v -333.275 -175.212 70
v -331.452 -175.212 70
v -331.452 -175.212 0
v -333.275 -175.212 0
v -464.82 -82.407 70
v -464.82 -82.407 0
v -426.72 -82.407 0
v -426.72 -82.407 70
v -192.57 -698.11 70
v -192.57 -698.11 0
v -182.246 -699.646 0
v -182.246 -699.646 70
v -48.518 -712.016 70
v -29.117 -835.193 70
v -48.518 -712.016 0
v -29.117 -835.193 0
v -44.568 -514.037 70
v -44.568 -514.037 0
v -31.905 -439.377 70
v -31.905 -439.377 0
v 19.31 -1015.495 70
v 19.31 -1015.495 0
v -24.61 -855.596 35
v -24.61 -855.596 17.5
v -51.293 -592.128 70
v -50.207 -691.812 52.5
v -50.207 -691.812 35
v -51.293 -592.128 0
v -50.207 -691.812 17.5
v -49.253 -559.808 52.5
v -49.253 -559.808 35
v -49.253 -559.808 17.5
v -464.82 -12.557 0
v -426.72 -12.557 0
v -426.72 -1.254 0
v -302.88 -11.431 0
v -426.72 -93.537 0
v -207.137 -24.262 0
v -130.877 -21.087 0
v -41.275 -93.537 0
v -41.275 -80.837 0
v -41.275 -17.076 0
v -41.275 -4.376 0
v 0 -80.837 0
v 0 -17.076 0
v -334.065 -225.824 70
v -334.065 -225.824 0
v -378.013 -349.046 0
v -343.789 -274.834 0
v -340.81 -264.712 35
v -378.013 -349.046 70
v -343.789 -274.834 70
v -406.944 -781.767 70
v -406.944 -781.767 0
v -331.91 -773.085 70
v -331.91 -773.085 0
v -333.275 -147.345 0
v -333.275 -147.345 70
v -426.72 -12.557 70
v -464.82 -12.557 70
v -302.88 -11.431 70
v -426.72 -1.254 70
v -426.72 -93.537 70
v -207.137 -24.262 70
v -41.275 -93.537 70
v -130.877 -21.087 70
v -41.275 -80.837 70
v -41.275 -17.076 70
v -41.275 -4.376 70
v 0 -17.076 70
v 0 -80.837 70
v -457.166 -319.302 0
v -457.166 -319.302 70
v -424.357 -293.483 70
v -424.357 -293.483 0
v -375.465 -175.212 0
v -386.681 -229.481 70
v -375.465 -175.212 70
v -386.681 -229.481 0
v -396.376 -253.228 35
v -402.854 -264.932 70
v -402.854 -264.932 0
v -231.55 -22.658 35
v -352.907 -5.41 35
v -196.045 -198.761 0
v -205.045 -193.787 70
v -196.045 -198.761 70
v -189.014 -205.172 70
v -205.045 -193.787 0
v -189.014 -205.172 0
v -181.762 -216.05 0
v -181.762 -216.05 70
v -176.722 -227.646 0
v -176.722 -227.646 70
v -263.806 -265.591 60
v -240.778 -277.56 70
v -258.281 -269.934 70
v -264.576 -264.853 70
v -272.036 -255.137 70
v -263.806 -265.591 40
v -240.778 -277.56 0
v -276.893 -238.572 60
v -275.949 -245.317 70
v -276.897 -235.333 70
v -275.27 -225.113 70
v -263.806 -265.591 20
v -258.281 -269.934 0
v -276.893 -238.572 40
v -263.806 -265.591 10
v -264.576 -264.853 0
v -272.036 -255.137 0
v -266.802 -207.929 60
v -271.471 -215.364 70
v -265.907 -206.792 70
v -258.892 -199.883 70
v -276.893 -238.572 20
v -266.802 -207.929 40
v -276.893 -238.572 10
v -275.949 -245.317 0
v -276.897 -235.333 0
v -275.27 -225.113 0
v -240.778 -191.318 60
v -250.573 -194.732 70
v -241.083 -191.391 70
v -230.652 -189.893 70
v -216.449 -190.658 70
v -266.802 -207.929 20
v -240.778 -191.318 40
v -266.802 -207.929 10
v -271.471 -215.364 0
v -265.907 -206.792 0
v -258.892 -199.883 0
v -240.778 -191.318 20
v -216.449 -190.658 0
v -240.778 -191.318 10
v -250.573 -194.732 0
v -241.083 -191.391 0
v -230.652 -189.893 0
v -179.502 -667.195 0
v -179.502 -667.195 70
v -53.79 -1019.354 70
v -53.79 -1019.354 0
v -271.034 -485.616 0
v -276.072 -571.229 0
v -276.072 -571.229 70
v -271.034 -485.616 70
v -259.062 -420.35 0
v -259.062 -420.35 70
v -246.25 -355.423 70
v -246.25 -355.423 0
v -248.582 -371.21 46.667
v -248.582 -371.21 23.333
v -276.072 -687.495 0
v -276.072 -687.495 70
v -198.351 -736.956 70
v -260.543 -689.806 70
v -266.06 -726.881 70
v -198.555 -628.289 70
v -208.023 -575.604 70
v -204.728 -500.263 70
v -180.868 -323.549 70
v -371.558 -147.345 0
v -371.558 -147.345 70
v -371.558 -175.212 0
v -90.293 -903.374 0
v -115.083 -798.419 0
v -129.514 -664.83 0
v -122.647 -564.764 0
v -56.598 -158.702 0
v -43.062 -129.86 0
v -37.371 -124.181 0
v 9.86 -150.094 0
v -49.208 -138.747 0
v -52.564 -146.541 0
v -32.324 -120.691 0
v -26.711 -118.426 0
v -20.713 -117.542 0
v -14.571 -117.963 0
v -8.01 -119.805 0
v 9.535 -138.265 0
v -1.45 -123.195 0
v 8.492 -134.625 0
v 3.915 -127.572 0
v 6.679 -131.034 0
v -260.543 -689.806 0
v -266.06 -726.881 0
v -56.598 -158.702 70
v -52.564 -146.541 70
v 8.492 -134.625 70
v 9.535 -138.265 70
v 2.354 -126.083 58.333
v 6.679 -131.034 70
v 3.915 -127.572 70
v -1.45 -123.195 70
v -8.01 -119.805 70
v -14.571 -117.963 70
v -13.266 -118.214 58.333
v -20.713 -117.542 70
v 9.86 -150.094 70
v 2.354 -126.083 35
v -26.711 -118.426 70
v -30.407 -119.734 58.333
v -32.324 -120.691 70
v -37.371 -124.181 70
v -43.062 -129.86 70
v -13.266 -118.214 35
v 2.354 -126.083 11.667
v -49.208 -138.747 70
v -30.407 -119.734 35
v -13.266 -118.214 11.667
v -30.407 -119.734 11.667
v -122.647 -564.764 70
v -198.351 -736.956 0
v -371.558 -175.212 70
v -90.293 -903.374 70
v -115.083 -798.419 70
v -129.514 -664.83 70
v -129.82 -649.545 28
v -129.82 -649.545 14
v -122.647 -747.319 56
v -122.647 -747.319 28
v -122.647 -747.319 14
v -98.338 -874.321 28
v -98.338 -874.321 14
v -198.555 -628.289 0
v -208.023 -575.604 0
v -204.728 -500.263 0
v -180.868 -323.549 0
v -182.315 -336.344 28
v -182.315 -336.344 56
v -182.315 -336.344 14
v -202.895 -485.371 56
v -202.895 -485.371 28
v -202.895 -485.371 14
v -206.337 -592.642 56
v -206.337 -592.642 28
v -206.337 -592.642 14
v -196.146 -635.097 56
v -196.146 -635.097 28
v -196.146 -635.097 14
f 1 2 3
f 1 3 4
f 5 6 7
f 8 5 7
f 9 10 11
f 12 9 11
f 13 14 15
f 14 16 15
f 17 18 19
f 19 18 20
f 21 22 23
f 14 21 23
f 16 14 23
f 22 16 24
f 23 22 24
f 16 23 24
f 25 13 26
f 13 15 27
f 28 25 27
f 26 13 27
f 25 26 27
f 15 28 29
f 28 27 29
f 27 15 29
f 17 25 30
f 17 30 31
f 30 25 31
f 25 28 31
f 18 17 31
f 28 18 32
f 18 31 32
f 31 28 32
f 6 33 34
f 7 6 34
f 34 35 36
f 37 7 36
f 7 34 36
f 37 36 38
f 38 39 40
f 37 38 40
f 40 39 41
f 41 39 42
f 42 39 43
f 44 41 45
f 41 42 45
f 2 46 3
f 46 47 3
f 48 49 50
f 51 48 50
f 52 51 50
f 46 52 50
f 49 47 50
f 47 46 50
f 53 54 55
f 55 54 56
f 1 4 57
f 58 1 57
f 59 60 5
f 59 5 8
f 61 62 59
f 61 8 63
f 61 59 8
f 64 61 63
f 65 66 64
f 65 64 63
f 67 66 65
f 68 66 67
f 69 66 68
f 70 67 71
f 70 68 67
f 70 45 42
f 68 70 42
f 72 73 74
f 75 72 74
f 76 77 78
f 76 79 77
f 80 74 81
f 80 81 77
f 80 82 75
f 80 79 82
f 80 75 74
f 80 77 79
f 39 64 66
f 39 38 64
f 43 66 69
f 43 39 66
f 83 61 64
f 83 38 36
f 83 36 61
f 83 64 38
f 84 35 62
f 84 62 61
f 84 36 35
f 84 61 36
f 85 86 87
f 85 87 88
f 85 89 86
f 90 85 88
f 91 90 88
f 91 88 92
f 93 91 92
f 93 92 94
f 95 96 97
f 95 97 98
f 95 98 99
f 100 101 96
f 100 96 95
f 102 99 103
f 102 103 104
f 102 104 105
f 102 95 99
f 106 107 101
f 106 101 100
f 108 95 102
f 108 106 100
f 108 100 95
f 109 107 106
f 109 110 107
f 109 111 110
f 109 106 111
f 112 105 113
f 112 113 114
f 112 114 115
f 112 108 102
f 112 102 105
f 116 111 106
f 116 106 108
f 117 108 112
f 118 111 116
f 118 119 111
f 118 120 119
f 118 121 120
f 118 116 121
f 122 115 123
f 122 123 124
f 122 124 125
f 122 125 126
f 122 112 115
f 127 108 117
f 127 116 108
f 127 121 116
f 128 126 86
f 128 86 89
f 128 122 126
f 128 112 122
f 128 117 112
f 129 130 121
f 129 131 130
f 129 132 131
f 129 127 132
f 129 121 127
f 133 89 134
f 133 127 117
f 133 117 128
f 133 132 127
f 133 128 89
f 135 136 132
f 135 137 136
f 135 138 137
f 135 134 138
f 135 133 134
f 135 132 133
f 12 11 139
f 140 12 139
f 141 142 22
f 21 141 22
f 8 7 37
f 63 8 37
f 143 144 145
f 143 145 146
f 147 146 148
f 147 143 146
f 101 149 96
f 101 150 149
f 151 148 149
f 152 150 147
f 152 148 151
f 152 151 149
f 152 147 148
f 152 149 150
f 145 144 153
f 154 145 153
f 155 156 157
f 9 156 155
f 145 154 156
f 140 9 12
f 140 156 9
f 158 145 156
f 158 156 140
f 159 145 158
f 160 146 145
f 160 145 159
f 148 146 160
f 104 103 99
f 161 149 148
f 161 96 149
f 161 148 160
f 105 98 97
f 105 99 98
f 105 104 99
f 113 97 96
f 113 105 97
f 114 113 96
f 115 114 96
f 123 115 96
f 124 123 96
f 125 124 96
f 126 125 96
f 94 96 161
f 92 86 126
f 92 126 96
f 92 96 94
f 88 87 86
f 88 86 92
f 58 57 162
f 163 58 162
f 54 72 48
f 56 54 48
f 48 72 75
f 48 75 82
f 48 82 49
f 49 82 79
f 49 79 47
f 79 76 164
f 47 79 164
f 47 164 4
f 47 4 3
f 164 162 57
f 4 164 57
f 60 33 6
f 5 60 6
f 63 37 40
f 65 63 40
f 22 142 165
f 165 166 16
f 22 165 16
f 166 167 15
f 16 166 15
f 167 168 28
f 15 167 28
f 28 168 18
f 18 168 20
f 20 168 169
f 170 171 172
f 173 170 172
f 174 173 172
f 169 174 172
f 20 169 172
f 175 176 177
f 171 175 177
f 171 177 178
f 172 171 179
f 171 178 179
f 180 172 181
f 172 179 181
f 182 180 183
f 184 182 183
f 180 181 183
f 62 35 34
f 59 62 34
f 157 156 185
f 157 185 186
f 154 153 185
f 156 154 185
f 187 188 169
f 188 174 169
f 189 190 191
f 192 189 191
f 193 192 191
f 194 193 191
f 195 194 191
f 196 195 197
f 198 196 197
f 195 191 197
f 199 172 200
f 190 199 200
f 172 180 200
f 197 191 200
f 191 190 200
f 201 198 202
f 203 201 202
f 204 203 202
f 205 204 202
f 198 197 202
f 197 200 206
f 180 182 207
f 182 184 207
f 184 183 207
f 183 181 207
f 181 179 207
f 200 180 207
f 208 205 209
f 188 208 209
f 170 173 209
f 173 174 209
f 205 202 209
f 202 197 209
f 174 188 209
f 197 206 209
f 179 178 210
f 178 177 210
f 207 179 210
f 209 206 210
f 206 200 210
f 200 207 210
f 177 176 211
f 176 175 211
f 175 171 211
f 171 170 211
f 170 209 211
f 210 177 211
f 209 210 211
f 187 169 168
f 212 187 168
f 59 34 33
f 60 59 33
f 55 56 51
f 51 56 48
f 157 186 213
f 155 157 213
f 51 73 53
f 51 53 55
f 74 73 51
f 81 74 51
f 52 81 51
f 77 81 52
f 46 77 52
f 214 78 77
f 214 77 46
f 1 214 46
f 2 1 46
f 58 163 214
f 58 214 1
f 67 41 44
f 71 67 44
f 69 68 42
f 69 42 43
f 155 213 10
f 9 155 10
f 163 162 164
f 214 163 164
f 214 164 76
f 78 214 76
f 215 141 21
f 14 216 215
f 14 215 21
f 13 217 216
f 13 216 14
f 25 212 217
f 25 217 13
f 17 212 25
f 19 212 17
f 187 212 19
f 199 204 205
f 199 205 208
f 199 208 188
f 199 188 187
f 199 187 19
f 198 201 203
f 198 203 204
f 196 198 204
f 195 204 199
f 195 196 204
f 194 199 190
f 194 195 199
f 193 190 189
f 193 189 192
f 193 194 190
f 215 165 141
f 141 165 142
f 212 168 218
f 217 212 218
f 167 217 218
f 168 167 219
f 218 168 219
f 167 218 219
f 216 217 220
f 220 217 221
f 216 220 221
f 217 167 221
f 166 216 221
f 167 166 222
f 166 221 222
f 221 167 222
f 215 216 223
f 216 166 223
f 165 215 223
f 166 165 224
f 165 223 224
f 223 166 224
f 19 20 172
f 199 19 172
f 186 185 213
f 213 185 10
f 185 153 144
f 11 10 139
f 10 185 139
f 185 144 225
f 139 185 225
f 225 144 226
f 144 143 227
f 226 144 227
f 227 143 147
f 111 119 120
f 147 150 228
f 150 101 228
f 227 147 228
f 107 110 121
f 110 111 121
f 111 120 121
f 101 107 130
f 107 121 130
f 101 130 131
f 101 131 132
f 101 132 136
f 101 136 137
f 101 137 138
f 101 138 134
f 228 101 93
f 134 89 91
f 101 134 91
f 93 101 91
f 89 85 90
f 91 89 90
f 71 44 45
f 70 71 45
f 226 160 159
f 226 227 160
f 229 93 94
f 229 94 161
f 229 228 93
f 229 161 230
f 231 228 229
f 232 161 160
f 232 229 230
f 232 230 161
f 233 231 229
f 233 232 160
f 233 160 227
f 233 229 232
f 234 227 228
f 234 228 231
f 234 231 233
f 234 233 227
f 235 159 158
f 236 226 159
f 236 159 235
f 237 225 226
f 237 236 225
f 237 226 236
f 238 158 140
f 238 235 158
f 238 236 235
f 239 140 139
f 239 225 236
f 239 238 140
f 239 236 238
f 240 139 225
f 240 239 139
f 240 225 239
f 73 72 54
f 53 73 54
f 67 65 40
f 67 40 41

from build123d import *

# Parameters (mm, degrees)
F1_DEPTH = 70
F5_DEPTH = 70
F6_DEPTH = 70
F7_DEPTH = 70


with BuildPart() as f1:
    # F0 (on Top) → F1 (new body)
    with BuildSketch(Plane.XY):
        with BuildLine():
            Line((0, -80.8369506478), (0, -17.0763648719))
            Line((0, -17.0763648719), (-41.275, -17.0763648719))
            Line((-41.275, -17.0763648719), (-41.275, -4.3763648719))
            add(Edge.make_bspline(
                [(-426.72, -1.2536168797), (-306.9792187663, -4.8540736601), (-252.8019208578, -30.7704452863), (-116.174750468, -23.9821132962), (-41.275, -4.3763648719)],
                knots=[0, 0, 0, 0, 0.5033484163, 1, 1, 1, 1], degree=3))
            Line((-426.72, -1.2536168797), (-426.72, -12.5568046654))
            Line((-426.72, -12.5568046654), (-464.82, -12.5568046654))
            Line((-464.82, -12.5568046654), (-464.8199992132, -82.4068046654))
            Line((-464.8199992132, -82.4068046654), (-426.72, -82.4068046654))
            Line((-426.72, -82.4068046654), (-426.72, -93.5369506478))
            Line((-426.72, -93.5369506478), (-41.275, -93.5369506478))
            Line((-41.275, -93.5369506478), (-41.275, -80.8369506478))
            Line((-41.275, -80.8369506478), (0, -80.8369506478))
        make_face()
    extrude(amount=F1_DEPTH)


with BuildPart() as f5:
    # F4 (on Top) → F5 (new body)
    with BuildSketch(Plane.XY):
        with BuildLine():
            add(Edge.make_bspline(
                [(-122.6474046707, -564.7638440132), (-125.2207719505, -588.1214450197), (-129.7239006189, -628.9948498946), (-130.2446044737, -665.3998124801), (-123.6550065599, -752.860146017), (-103.8626584793, -866.2670547327), (-71.3538788225, -965.6552130056), (-53.7897534668, -1019.3535089493)],
                knots=[0, 0, 0, 0, 0.1714343031, 0.2999924383, 0.4945794726, 0.726927015, 1, 1, 1, 1], degree=3))
            Line((-53.7897534668, -1019.3535089493), (19.3095318973, -1015.4951810837))
            add(Edge.make_bspline(
                [(19.3095318973, -1015.4951810837), (3.5023515074, -962.8189042984), (-27.7601855053, -857.3367838343), (-54.9150007121, -693.7287526118), (-51.4161941333, -555.9076583898), (-40.0048601129, -477.1224978312), (-31.9047160447, -439.3770694733)],
                knots=[0, 0, 0, 0, 0.2668561673, 0.5336319067, 0.77620599, 1, 1, 1, 1], degree=3))
            Line((-31.9047160447, -439.3770694733), (9.8597547039, -150.0941514969))
            add(Edge.make_bspline(
                [(9.8597547039, -150.0941514969), (10.054987464, -146.8694243337), (10.4623393048, -140.1345000197), (6.8682018469, -128.222677129), (-10.1124407795, -116.7968467644), (-31.3320399103, -117.0829821984), (-47.7479860951, -134.1869515337), (-51.7660707931, -143.1547142728), (-56.5981976688, -158.7018221617)],
                knots=[0, 0, 0, 0, 0.1241830915, 0.2596570039, 0.4341317578, 0.6117348373, 0.7875031625, 1, 1, 1, 1], degree=3))
            Line((-56.5981976688, -158.7018221617), (-122.6474046707, -564.7638440132))
        make_face()
    extrude(amount=F5_DEPTH)


with BuildPart() as f6:
    # F2 (on Top) → F6 (new body)
    with BuildSketch(Plane.XY):
        with BuildLine():
            Line((-457.1660161018, -319.3023993452), (-406.9436192513, -781.7666127165))
            Line((-406.9436192513, -781.7666127165), (-331.909507513, -773.0849577864))
            Line((-331.909507513, -773.0849577864), (-378.0133426189, -349.0461005648))
            add(Edge.make_bspline(
                [(-378.0133426189, -349.0461005648), (-363.287199279, -321.4582734772), (-334.0107736625, -266.6120758675), (-332.3012115062, -205.556240959), (-331.4515650272, -175.2117021759)],
                knots=[0, 0, 0, 0, 0.5030034586, 1, 1, 1, 1], degree=3))
            Line((-331.4515650272, -175.2117021759), (-333.2745730877, -175.2117021759))
            Line((-333.2745730877, -175.2117021759), (-333.2745730877, -147.3453982552))
            Line((-333.2745730877, -147.3453982552), (-371.5581893921, -147.3453982552))
            Line((-371.5581893921, -147.3453982552), (-371.5581893921, -175.2117021759))
            Line((-371.5581893921, -175.2117021759), (-375.4646778107, -175.2117021759))
            add(Edge.make_bspline(
                [(-457.1660161018, -319.3023993452), (-425.2507984638, -301.1343671759), (-389.7742344375, -248.4986877124), (-382.9227387905, -219.1031916817), (-375.4646778107, -175.2117021759)],
                knots=[0, 0, 0, 0, 0.5132222227, 1, 1, 1, 1], degree=3))
        make_face()
    extrude(amount=F6_DEPTH)


with BuildPart() as f7:
    # F3 (on Top) → F7 (new body)
    with BuildSketch(Plane.XY):
        with BuildLine():
            Line((-198.3508691785, -736.9563750927), (-192.570263139, -698.1096932839))
            Line((-192.570263139, -698.1096932839), (-182.2459936058, -699.646003003))
            Line((-182.2459936058, -699.646003003), (-179.5019714315, -667.1954215657))
            add(Edge.make_bspline(
                [(-176.7223119652, -227.6458809327), (-176.5668190951, -252.3115382516), (-176.1922654752, -312.4950087519), (-204.7238971979, -485.055755701), (-211.4005836768, -570.2125064946), (-199.9751960664, -632.8872494954), (-185.9489787847, -656.6227252698), (-179.5019714315, -667.1954215657)],
                knots=[0, 0, 0, 0, 0.2005686368, 0.4895561474, 0.6959523, 0.8640715055, 0.9999700147, 0.9999700147, 0.9999700147, 0.9999700147], degree=3))
            add(Edge.make_bspline(
                [(-240.7775610602, -277.5602707814), (-247.7280476649, -275.2430077452), (-262.6842473417, -270.2566736012), (-281.869053969, -243.1155566289), (-270.6732085806, -206.1923384198), (-242.1178571449, -187.5442706078), (-203.595595518, -190.5107065704), (-184.376110688, -208.4373248487), (-179.185157985, -221.4649350246), (-176.7223119652, -227.6458809327)],
                knots=[0, 0, 0, 0, 0.1271694583, 0.2736458494, 0.4319132409, 0.5843211966, 0.7458980823, 0.8794414181, 1, 1, 1, 1], degree=3))
            add(Edge.make_bspline(
                [(-276.0719417483, -571.228868718), (-274.8657073732, -534.7203435732), (-272.5258652754, -463.9014498122), (-244.7365606276, -372.1927279718), (-242.0950778124, -309.0530369528), (-240.7775610602, -277.5602707814)],
                knots=[0, 0, 0, 0, 0.3478256902, 0.674709003, 1, 1, 1, 1], degree=3))
            Line((-276.0719417483, -571.228868718), (-276.0719417483, -687.4953368074))
            Line((-276.0719417483, -687.4953368074), (-260.5428447788, -689.8061542968))
            Line((-260.5428447788, -689.8061542968), (-266.0597776571, -726.8809064283))
            Line((-266.0597776571, -726.8809064283), (-198.3508691785, -736.9563750927))
        make_face()
    extrude(amount=F7_DEPTH)


solid = Compound([f1.part, f5.part, f6.part, f7.part])
